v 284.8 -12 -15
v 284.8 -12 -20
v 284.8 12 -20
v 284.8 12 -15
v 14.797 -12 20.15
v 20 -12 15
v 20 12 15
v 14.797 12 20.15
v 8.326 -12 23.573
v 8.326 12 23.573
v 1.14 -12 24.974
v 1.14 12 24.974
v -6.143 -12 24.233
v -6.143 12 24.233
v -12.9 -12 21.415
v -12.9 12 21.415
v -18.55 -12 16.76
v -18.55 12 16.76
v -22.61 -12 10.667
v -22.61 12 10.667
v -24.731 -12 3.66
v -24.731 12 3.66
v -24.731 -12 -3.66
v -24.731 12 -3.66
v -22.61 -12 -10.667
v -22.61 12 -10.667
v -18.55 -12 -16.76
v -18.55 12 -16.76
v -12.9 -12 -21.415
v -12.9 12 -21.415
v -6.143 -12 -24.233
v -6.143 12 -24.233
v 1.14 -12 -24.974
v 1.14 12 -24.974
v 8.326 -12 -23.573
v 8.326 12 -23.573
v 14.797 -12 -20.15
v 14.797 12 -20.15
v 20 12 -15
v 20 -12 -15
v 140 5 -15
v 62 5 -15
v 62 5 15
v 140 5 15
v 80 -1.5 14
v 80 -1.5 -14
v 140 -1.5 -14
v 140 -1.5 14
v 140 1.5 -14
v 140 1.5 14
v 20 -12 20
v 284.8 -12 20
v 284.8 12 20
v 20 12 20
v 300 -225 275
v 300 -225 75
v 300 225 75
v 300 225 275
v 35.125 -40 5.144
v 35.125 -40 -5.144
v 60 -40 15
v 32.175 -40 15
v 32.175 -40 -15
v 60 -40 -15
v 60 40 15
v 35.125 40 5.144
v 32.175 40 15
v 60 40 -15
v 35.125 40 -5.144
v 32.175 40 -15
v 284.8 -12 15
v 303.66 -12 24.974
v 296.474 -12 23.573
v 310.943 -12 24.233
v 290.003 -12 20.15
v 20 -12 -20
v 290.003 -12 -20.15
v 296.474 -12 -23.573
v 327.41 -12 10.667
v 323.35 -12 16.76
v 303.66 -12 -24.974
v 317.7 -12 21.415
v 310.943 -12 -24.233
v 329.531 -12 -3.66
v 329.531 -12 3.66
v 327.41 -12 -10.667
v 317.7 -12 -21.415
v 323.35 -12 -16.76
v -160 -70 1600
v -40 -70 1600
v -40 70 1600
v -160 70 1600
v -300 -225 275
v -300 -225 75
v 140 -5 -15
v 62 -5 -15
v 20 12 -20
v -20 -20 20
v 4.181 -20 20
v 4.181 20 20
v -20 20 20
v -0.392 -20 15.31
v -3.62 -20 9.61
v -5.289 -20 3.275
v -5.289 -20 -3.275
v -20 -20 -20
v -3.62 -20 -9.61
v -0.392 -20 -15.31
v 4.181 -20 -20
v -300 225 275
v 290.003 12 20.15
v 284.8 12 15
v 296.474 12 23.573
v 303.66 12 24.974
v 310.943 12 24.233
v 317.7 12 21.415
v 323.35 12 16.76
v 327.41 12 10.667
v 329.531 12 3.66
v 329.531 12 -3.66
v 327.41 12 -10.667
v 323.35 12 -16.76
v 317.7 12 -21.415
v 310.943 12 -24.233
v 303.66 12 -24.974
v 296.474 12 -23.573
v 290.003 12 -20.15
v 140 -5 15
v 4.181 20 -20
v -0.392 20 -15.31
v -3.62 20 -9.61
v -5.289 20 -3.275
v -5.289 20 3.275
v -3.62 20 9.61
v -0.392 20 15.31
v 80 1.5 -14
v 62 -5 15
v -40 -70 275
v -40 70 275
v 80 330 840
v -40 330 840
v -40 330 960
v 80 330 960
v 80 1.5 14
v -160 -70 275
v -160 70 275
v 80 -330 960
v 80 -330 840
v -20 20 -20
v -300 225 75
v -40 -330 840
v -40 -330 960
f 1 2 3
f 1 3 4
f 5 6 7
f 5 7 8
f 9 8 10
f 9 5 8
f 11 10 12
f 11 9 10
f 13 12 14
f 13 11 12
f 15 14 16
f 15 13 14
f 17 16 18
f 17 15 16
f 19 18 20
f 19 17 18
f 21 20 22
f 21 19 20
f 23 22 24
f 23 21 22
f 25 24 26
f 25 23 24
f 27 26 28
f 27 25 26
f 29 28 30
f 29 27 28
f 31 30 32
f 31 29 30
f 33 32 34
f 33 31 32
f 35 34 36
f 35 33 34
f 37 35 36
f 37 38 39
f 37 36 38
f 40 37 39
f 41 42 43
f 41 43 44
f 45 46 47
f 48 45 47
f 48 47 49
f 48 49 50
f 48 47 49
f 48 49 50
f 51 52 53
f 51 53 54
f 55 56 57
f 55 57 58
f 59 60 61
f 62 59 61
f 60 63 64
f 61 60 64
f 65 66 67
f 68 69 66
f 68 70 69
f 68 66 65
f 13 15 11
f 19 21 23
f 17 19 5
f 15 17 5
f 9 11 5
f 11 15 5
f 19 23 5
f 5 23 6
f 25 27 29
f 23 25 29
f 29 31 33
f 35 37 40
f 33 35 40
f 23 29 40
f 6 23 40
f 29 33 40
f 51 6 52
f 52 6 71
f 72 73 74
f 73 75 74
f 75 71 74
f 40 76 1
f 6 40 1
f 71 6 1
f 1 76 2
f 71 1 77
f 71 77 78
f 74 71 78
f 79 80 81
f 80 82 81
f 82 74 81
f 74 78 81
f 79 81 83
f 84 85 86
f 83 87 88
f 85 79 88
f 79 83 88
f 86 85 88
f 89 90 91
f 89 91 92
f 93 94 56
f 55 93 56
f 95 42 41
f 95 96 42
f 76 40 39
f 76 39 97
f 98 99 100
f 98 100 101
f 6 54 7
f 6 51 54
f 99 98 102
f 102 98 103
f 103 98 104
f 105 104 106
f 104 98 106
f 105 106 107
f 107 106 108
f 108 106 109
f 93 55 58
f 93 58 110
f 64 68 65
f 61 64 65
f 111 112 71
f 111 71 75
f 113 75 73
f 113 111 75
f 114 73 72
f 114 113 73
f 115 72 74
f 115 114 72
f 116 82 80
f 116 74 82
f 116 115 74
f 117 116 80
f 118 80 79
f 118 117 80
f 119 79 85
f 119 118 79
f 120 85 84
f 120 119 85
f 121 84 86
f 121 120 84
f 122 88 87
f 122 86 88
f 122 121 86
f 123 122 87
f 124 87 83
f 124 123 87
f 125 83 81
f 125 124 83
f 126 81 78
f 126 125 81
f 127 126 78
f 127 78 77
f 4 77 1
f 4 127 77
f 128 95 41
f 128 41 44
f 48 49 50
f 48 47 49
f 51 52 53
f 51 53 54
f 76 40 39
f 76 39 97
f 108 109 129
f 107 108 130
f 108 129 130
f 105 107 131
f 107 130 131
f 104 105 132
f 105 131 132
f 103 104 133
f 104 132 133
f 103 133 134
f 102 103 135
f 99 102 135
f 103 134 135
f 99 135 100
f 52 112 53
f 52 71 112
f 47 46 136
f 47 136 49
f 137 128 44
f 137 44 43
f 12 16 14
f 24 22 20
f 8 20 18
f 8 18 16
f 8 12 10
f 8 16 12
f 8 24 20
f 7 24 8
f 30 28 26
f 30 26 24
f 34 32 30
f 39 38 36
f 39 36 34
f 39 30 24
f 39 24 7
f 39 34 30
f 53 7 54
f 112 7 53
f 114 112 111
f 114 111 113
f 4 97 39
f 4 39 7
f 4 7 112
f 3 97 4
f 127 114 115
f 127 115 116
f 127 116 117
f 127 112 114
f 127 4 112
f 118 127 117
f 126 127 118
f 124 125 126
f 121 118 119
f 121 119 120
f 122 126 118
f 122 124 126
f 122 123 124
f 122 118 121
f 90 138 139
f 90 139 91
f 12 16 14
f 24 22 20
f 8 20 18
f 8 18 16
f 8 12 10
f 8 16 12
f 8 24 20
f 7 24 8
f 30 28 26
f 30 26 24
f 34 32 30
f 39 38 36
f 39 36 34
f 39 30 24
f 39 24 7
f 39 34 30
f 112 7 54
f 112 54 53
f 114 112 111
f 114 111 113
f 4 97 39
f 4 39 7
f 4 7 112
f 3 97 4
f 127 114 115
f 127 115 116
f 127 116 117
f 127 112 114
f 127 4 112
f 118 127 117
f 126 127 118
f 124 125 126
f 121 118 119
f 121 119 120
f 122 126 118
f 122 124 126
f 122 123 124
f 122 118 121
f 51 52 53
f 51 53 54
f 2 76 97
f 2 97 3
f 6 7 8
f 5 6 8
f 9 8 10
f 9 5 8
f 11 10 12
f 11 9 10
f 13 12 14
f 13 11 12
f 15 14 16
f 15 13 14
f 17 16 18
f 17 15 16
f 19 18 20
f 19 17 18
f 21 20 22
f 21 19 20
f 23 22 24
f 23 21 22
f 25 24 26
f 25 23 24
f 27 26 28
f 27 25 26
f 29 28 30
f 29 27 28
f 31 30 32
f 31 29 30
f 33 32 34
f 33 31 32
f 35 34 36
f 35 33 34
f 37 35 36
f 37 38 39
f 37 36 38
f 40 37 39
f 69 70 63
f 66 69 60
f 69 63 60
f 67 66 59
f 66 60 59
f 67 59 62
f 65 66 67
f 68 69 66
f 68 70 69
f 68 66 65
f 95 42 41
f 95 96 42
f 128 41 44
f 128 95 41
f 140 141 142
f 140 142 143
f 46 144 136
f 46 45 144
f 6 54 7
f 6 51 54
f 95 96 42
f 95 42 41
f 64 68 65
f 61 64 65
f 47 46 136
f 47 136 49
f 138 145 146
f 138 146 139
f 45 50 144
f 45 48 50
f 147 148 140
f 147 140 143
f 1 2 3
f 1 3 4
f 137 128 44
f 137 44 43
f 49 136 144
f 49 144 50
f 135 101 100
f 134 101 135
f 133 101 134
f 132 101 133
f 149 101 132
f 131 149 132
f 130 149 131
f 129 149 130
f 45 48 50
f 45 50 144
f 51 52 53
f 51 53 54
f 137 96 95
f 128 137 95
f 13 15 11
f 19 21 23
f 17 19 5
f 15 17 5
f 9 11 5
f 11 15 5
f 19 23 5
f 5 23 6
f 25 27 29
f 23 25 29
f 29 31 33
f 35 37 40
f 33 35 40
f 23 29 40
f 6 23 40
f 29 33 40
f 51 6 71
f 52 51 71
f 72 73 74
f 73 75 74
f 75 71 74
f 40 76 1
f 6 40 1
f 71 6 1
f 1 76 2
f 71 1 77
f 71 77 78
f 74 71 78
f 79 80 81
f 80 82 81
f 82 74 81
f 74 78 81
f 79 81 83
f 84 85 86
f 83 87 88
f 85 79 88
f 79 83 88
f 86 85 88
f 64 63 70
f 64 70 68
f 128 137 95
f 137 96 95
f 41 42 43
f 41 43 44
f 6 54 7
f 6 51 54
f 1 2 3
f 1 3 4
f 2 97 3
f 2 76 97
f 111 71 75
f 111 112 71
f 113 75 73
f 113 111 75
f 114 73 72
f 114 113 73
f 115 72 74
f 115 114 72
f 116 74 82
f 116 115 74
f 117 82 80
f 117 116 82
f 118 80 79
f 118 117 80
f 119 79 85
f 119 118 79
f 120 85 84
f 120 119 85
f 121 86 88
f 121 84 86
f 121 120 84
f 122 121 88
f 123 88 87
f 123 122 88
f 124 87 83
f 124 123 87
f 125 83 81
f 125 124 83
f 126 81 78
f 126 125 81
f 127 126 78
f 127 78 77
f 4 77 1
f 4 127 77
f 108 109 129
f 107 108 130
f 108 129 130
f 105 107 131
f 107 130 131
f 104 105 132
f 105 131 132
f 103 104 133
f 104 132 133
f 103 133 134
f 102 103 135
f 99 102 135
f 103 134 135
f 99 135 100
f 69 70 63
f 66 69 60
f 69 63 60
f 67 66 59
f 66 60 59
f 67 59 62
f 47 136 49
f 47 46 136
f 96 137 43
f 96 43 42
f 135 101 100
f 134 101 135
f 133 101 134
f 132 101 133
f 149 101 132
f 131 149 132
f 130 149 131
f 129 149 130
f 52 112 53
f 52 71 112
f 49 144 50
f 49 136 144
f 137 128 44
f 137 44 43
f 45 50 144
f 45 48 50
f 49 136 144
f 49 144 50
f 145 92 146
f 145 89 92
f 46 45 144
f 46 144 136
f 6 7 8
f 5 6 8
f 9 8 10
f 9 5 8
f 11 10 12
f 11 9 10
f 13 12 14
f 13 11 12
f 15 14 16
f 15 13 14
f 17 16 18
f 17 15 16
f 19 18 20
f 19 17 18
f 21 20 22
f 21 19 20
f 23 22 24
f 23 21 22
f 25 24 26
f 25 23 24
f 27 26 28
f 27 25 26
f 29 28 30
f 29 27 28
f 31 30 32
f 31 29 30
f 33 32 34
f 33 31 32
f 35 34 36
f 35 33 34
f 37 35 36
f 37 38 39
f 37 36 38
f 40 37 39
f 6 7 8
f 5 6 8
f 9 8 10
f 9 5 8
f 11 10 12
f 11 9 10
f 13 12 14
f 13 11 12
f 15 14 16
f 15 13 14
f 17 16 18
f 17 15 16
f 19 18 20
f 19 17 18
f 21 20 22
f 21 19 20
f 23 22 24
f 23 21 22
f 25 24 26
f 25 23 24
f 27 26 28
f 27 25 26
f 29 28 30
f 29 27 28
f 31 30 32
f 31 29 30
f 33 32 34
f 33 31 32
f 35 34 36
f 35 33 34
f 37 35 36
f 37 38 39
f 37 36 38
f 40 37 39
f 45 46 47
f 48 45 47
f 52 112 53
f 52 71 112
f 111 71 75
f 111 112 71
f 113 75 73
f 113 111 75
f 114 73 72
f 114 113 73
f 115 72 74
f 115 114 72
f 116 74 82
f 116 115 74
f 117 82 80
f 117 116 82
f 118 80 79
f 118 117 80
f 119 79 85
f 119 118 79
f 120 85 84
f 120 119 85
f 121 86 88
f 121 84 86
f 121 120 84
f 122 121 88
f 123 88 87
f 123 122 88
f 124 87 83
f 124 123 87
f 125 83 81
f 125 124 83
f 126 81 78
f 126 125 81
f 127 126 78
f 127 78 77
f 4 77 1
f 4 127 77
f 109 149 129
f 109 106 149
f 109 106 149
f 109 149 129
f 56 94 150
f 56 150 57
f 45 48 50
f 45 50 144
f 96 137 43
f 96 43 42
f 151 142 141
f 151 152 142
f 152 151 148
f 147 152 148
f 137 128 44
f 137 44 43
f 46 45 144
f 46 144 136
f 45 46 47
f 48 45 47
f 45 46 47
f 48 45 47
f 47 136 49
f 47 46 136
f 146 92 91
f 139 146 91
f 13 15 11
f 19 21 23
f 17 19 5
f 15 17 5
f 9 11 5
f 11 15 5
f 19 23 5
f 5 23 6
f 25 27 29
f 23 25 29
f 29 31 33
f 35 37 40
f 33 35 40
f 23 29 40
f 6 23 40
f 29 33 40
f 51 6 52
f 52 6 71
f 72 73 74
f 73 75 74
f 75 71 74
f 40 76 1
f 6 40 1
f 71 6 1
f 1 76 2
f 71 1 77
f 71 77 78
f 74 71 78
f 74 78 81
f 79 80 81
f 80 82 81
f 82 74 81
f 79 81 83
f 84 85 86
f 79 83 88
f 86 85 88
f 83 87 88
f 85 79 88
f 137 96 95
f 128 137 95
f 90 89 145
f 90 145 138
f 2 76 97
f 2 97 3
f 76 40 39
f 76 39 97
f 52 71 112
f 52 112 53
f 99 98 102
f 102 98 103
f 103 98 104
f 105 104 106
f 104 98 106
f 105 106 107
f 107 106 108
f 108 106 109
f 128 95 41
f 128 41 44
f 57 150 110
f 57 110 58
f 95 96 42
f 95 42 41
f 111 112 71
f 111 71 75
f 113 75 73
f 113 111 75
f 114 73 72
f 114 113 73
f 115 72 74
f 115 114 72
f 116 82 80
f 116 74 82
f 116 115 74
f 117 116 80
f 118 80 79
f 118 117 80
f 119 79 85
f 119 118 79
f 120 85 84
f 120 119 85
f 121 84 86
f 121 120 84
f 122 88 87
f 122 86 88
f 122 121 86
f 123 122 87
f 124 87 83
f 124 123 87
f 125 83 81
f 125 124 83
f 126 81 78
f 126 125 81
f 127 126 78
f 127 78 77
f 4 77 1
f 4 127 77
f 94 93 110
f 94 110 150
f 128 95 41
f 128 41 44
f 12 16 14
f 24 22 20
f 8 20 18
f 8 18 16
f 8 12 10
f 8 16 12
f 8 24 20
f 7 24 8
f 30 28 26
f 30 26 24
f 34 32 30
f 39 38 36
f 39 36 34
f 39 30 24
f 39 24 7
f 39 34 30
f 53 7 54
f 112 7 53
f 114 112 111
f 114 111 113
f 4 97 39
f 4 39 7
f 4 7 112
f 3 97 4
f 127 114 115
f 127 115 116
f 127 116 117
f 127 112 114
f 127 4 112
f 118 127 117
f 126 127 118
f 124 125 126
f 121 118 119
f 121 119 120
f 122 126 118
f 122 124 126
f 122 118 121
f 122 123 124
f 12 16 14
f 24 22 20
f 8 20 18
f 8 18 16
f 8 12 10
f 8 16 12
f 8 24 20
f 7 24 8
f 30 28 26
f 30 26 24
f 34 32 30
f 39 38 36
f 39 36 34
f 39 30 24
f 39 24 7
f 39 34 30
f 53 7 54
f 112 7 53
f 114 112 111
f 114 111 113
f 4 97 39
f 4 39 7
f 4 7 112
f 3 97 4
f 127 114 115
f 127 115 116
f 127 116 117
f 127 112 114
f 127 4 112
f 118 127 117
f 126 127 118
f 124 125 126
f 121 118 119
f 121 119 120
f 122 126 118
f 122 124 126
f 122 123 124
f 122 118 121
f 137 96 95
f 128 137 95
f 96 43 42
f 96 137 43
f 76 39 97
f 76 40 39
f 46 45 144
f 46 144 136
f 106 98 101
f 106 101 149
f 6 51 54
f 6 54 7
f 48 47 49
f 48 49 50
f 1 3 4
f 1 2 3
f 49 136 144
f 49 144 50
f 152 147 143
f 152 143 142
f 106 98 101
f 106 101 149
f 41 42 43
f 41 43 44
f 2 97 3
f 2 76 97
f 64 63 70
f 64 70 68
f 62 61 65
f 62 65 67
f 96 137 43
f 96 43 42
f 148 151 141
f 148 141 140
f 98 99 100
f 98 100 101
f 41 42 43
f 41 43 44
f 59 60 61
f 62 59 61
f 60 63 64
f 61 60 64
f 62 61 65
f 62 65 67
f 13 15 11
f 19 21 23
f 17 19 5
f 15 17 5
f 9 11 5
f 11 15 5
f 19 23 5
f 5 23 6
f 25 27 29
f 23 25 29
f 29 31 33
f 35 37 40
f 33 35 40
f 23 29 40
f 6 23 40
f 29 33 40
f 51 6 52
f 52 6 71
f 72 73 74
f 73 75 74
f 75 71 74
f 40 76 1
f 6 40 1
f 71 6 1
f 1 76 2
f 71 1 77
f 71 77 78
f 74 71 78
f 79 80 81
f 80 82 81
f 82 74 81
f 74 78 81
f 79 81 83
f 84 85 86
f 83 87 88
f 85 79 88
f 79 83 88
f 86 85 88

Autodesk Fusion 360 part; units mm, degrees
sketch "Layout_Side" plane through (0, 0, 0) normal (0, 1, 0) x (1, 0, 0) in component "00_Layout"
  line L0 (0, 0) -> (0, -1676.4) construction
  line L1 (300, -275) -> (-300, -275) construction
  line L2 (-300, -275) -> (-300, -75) construction
  line L3 (-300, -75) -> (300, -75) construction
  line L4 (300, -75) -> (300, -275) construction
  line L5 (300, -275) -> (-300, -75) construction
  line L6 (-300, -275) -> (300, -75) construction
  line L7 (0, -1676.4) -> (600, -1676.4) construction
  line L8 (0, -175) -> (0, -75) construction
  dimension "d1" = 200
  dimension "d2" = 600
  dimension "d4" = 600
  dimension "d5" = 75
  dimension "d6" = 1676.4
sketch "Base_Profile" plane through (0, 0, 0) normal (0, 1, 0) x (1, 0, 0) in component "01_Base_Envelope"
  line L0 (300, -275) -> (-300, -275)
  line L1 (-300, -275) -> (-300, -75)
  line L2 (-300, -75) -> (300, -75)
  line L3 (300, -75) -> (300, -275)
extrude "Chassis_Width_450mm" add sketch "Base_Profile" along normal mid plane 450 makes body 1 in component "01_Base_Envelope"
sketch "Mast_Envelope_Side_Profile" plane through (0, 0, 0) normal (0, 1, 0) x (1, 0, 0) in component "02_Mast_Envelope"
  line L0 (-160, -275) -> (-40, -275)
  line L1 (-40, -275) -> (-40, -1600)
  line L2 (-40, -1600) -> (-160, -1600)
  line L3 (-160, -1600) -> (-160, -275)
  line L4 (300, -275) -> (-300, -275) construction
  dimension "d9" = 120
  dimension "d10" = 1325
  dimension "d11" = 160
extrude "Mast_Envelope_Width_140mm" add sketch "Mast_Envelope_Side_Profile" along normal mid plane 140 separate body makes body 2 in component "02_Mast_Envelope"
sketch "Shared_Carriage_Side_Profile" plane through (0, 0, 0) normal (0, 1, 0) x (1, 0, 0) in component "03_Shared_Carriage"
  line L0 (-40, -840) -> (80, -840)
  line L1 (80, -840) -> (80, -960)
  line L2 (80, -960) -> (-40, -960)
  line L3 (-40, -960) -> (-40, -840)
  dimension "d14" = 120
  dimension "d15" = 120
  dimension "d16" = 40
  dimension "d17" = 840
extrude "Shared_Carriage_Width_660mm" add sketch "Shared_Carriage_Side_Profile" along normal mid plane 660 separate body makes body 3 in component "03_Shared_Carriage"
ref_plane "WorkPlane1" through (0, 300, 0) normal (0, 1, 0) x (0, 0, 1) in component "00_Layout"
sketch "Reach_Left_Floor_2x304p8mm" plane through (0, 300, 0) normal (0, 1, 0) x (1, 0, 0) in component "00_Layout"
  circle A0 centre (80, -400) radius 609.6 construction
  line L0 (80, -400) -> (380.0994, -346.6765) construction
  line L1 (380.0994, -346.6765) -> (450, -50) construction
  dimension "d25" = 80
  dimension "d26" = 400
  dimension "d27" = 450
  dimension "d28" = 50
  dimension "d29" = 609.6
  dimension "d30" = 304.8
  dimension "d31" = 304.8
sketch "Reach_Left_Shelf_2x304p8mm" plane through (0, 300, 0) normal (0, 1, 0) x (1, 0, 0) in component "00_Layout"
  circle A0 centre (80, -1400) radius 609.6 construction
  line L0 (80, -1400) -> (198.6357, -1680.7643) construction
  line L1 (198.6357, -1680.7643) -> (500, -1726.4) construction
  dimension "d32" = 80
  dimension "d33" = 1400
  dimension "d34" = 500
  dimension "d35" = 1726.4
  dimension "d36" = 609.6
  dimension "d37" = 304.8
  dimension "d38" = 304.8
ref_plane "WorkPlane2" through (0, -300, 0) normal (0, 1, 0) x (0, 0, 1) in component "00_Layout"
sketch "Reach_Right_Floor_2x304p8mm" plane through (0, -300, 0) normal (0, 1, 0) x (1, 0, 0) in component "00_Layout"
  circle A0 centre (80, -400) radius 609.6 construction
  line L0 (80, -400) -> (380.0994, -346.6765) construction
  line L1 (380.0994, -346.6765) -> (450, -50) construction
  dimension "d41" = 80
  dimension "d42" = 400
  dimension "d43" = 450
  dimension "d44" = 50
  dimension "d45" = 609.6
  dimension "d46" = 304.8
  dimension "d47" = 304.8
sketch "Reach_Right_Shelf_2x304p8mm" plane through (0, -300, 0) normal (0, 1, 0) x (1, 0, 0) in component "00_Layout"
  circle A0 centre (80, -1400) radius 609.6 construction
  line L0 (80, -1400) -> (198.6357, -1680.7643) construction
  line L1 (198.6357, -1680.7643) -> (500, -1726.4) construction
  dimension "d48" = 80
  dimension "d49" = 1400
  dimension "d50" = 500
  dimension "d51" = 1726.4
  dimension "d52" = 609.6
  dimension "d53" = 304.8
  dimension "d54" = 304.8
sketch "Shoulder_Mount_Profile" plane through (0, 0, 0) normal (0, 1, 0) x (1, 0, 0) in component "04_Left_Shoulder_Standoff"
  line L0 (-20, 20) -> (20, 20)
  line L1 (20, 20) -> (20, -20)
  line L2 (20, -20) -> (-20, -20)
  line L3 (-20, -20) -> (-20, 20)
  dimension "d55" = 20
  dimension "d56" = 20
  dimension "d57" = 40
  dimension "d58" = 40
extrude "Shoulder_Mount" add sketch "Shoulder_Mount_Profile" along normal mid plane 40 separate body makes body 4 in component "04_Left_Shoulder_Standoff"
sketch "Upper_Link_304p8mm_Profile" plane through (0, 0, 0) normal (0, 1, 0) x (1, 0, 0) in component "05_Left_Upper_Arm"
  line L0 (20, 20) -> (284.8, 20)
  line L1 (284.8, 20) -> (284.8, -20)
  line L2 (284.8, -20) -> (20, -20)
  line L3 (20, -20) -> (20, 20)
  dimension "d61" = 20
  dimension "d62" = 20
  dimension "d63" = 264.8
  dimension "d64" = 40
extrude "Upper_Link_304p8mm" add sketch "Upper_Link_304p8mm_Profile" along normal mid plane 24 separate body makes body 5 in component "05_Left_Upper_Arm"
sketch "Joint_Axis_Locations" plane through (0, 0, 0) normal (0, 1, 0) x (1, 0, 0) in component "05_Left_Upper_Arm"
  line L0 (0, 0) -> (304.8, 0) construction
  dimension "d67" = 304.8
sketch "Fore_Link_304p8mm_Profile" plane through (0, 0, 0) normal (0, 1, 0) x (1, 0, 0) in component "06_Left_Forearm"
  line L0 (20, 20) -> (284.8, 20)
  line L1 (284.8, 20) -> (284.8, -20)
  line L2 (284.8, -20) -> (20, -20)
  line L3 (20, -20) -> (20, 20)
  dimension "d68" = 20
  dimension "d69" = 20
  dimension "d70" = 264.8
  dimension "d71" = 40
extrude "Fore_Link_304p8mm" add sketch "Fore_Link_304p8mm_Profile" along normal mid plane 24 separate body makes body 6 in component "06_Left_Forearm"
sketch "Joint_Axis_Locations (2)" plane through (0, 0, 0) normal (0, 1, 0) x (1, 0, 0) in component "06_Left_Forearm"
  line L0 (0, 0) -> (304.8, 0) construction
  dimension "d74" = 304.8
sketch "Palm_Envelope_Profile" plane through (0, 0, 0) normal (0, 1, 0) x (1, 0, 0) in component "07_Left_Wrist_Palm"
  line L0 (5, 15) -> (60, 15)
  line L1 (60, 15) -> (60, -15)
  line L2 (60, -15) -> (5, -15)
  line L3 (5, -15) -> (5, 15)
  dimension "d75" = 5
  dimension "d76" = 15
  dimension "d77" = 55
  dimension "d78" = 30
extrude "Palm_Envelope" add sketch "Palm_Envelope_Profile" along normal mid plane 80 separate body makes body 7 in component "07_Left_Wrist_Palm"
sketch "Joint_Axis_Locations (3)" plane through (0, 0, 0) normal (0, 1, 0) x (1, 0, 0) in component "07_Left_Wrist_Palm"
  line L0 (0, 0) -> (110, 0) construction
  dimension "d81" = 110
sketch "Finger_Envelope_Profile" plane through (0, 0, 0) normal (0, 1, 0) x (1, 0, 0) in component "08_Left_Finger_Positive"
  line L0 (62, 15) -> (140, 15)
  line L1 (140, 15) -> (140, -15)
  line L2 (140, -15) -> (62, -15)
  line L3 (62, -15) -> (62, 15)
  dimension "d88" = 62
  dimension "d89" = 15
  dimension "d90" = 78
  dimension "d91" = 30
extrude "Finger_Envelope" add sketch "Finger_Envelope_Profile" along normal mid plane 10 separate body makes body 8 in component "08_Left_Finger_Positive"
sketch "Soft_Pad_Envelope_Profile" plane through (0, 0, 0) normal (0, 1, 0) x (1, 0, 0) in component "09_Left_Pad_Positive"
  line L0 (80, 14) -> (140, 14)
  line L1 (140, 14) -> (140, -14)
  line L2 (140, -14) -> (80, -14)
  line L3 (80, -14) -> (80, 14)
  dimension "d94" = 80
  dimension "d95" = 14
  dimension "d96" = 60
  dimension "d97" = 28
extrude "Soft_Pad_Envelope" add sketch "Soft_Pad_Envelope_Profile" along normal mid plane 3 separate body makes body 9 in component "09_Left_Pad_Positive"
sketch "Finger_Envelope_Profile (2)" plane through (0, 0, 0) normal (0, 1, 0) x (1, 0, 0) in component "08_Left_Finger_Negative"
  line L0 (62, 15) -> (140, 15)
  line L1 (140, 15) -> (140, -15)
  line L2 (140, -15) -> (62, -15)
  line L3 (62, -15) -> (62, 15)
  dimension "d102" = 62
  dimension "d103" = 15
  dimension "d104" = 78
  dimension "d105" = 30
extrude "Finger_Envelope'" add sketch "Finger_Envelope_Profile (2)" along normal mid plane 10 separate body makes body 10 in component "08_Left_Finger_Negative"
sketch "Soft_Pad_Envelope_Profile (2)" plane through (0, 0, 0) normal (0, 1, 0) x (1, 0, 0) in component "09_Left_Pad_Negative"
  line L0 (80, 14) -> (140, 14)
  line L1 (140, 14) -> (140, -14)
  line L2 (140, -14) -> (80, -14)
  line L3 (80, -14) -> (80, 14)
  dimension "d108" = 80
  dimension "d109" = 14
  dimension "d110" = 60
  dimension "d111" = 28
extrude "Soft_Pad_Envelope'" add sketch "Soft_Pad_Envelope_Profile (2)" along normal mid plane 3 separate body makes body 11 in component "09_Left_Pad_Negative"
sketch "Shoulder_Mount_Profile (2)" plane through (0, 0, 0) normal (0, 1, 0) x (1, 0, 0) in component "04_Right_Shoulder_Standoff"
  line L0 (-20, 20) -> (20, 20)
  line L1 (20, 20) -> (20, -20)
  line L2 (20, -20) -> (-20, -20)
  line L3 (-20, -20) -> (-20, 20)
  dimension "d116" = 20
  dimension "d117" = 20
  dimension "d118" = 40
  dimension "d119" = 40
extrude "Shoulder_Mount'" add sketch "Shoulder_Mount_Profile (2)" along normal mid plane 40 separate body makes body 12 in component "04_Right_Shoulder_Standoff"
sketch "Upper_Link_304p8mm_Profile (2)" plane through (0, 0, 0) normal (0, 1, 0) x (1, 0, 0) in component "05_Right_Upper_Arm"
  line L0 (20, 20) -> (284.8, 20)
  line L1 (284.8, 20) -> (284.8, -20)
  line L2 (284.8, -20) -> (20, -20)
  line L3 (20, -20) -> (20, 20)
  dimension "d122" = 20
  dimension "d123" = 20
  dimension "d124" = 264.8
  dimension "d125" = 40
extrude "Upper_Link_304p8mm'" add sketch "Upper_Link_304p8mm_Profile (2)" along normal mid plane 24 separate body makes body 13 in component "05_Right_Upper_Arm"
sketch "Joint_Axis_Locations (4)" plane through (0, 0, 0) normal (0, 1, 0) x (1, 0, 0) in component "05_Right_Upper_Arm"
  line L0 (0, 0) -> (304.8, 0) construction
  dimension "d128" = 304.8
sketch "Fore_Link_304p8mm_Profile (2)" plane through (0, 0, 0) normal (0, 1, 0) x (1, 0, 0) in component "06_Right_Forearm"
  line L0 (20, 20) -> (284.8, 20)
  line L1 (284.8, 20) -> (284.8, -20)
  line L2 (284.8, -20) -> (20, -20)
  line L3 (20, -20) -> (20, 20)
  dimension "d129" = 20
  dimension "d130" = 20
  dimension "d131" = 264.8
  dimension "d132" = 40
extrude "Fore_Link_304p8mm'" add sketch "Fore_Link_304p8mm_Profile (2)" along normal mid plane 24 separate body makes body 14 in component "06_Right_Forearm"
sketch "Joint_Axis_Locations (5)" plane through (0, 0, 0) normal (0, 1, 0) x (1, 0, 0) in component "06_Right_Forearm"
  line L0 (0, 0) -> (304.8, 0) construction
  dimension "d135" = 304.8
sketch "Palm_Envelope_Profile (2)" plane through (0, 0, 0) normal (0, 1, 0) x (1, 0, 0) in component "07_Right_Wrist_Palm"
  line L0 (5, 15) -> (60, 15)
  line L1 (60, 15) -> (60, -15)
  line L2 (60, -15) -> (5, -15)
  line L3 (5, -15) -> (5, 15)
  dimension "d136" = 5
  dimension "d137" = 15
  dimension "d138" = 55
  dimension "d139" = 30
extrude "Palm_Envelope'" add sketch "Palm_Envelope_Profile (2)" along normal mid plane 80 separate body makes body 15 in component "07_Right_Wrist_Palm"
sketch "Joint_Axis_Locations (6)" plane through (0, 0, 0) normal (0, 1, 0) x (1, 0, 0) in component "07_Right_Wrist_Palm"
  line L0 (0, 0) -> (110, 0) construction
  dimension "d142" = 110
sketch "Finger_Envelope_Profile (3)" plane through (0, 0, 0) normal (0, 1, 0) x (1, 0, 0) in component "08_Right_Finger_Positive"
  line L0 (62, 15) -> (140, 15)
  line L1 (140, 15) -> (140, -15)
  line L2 (140, -15) -> (62, -15)
  line L3 (62, -15) -> (62, 15)
  dimension "d149" = 62
  dimension "d150" = 15
  dimension "d151" = 78
  dimension "d152" = 30
extrude "Finger_Envelope''" add sketch "Finger_Envelope_Profile (3)" along normal mid plane 10 separate body makes body 16 in component "08_Right_Finger_Positive"
sketch "Soft_Pad_Envelope_Profile (3)" plane through (0, 0, 0) normal (0, 1, 0) x (1, 0, 0) in component "09_Right_Pad_Positive"
  line L0 (80, 14) -> (140, 14)
  line L1 (140, 14) -> (140, -14)
  line L2 (140, -14) -> (80, -14)
  line L3 (80, -14) -> (80, 14)
  dimension "d155" = 80
  dimension "d156" = 14
  dimension "d157" = 60
  dimension "d158" = 28
extrude "Soft_Pad_Envelope''" add sketch "Soft_Pad_Envelope_Profile (3)" along normal mid plane 3 separate body makes body 17 in component "09_Right_Pad_Positive"
sketch "Finger_Envelope_Profile (4)" plane through (0, 0, 0) normal (0, 1, 0) x (1, 0, 0) in component "08_Right_Finger_Negative"
  line L0 (62, 15) -> (140, 15)
  line L1 (140, 15) -> (140, -15)
  line L2 (140, -15) -> (62, -15)
  line L3 (62, -15) -> (62, 15)
  dimension "d163" = 62
  dimension "d164" = 15
  dimension "d165" = 78
  dimension "d166" = 30
extrude "Finger_Envelope'''" add sketch "Finger_Envelope_Profile (4)" along normal mid plane 10 separate body makes body 18 in component "08_Right_Finger_Negative"
sketch "Soft_Pad_Envelope_Profile (4)" plane through (0, 0, 0) normal (0, 1, 0) x (1, 0, 0) in component "09_Right_Pad_Negative"
  line L0 (80, 14) -> (140, 14)
  line L1 (140, 14) -> (140, -14)
  line L2 (140, -14) -> (80, -14)
  line L3 (80, -14) -> (80, 14)
  dimension "d169" = 80
  dimension "d170" = 14
  dimension "d171" = 60
  dimension "d172" = 28
extrude "Soft_Pad_Envelope'''" add sketch "Soft_Pad_Envelope_Profile (4)" along normal mid plane 3 separate body makes body 19 in component "09_Right_Pad_Negative"
sketch "Pivot_Housing_Envelopes" plane through (0, 0, 0) normal (0, 1, 0) x (1, 0, 0) in component "05_Left_Upper_Arm"
  circle A0 centre (0, 0) radius 25
  line L0 (0, 0) -> (304.8, 0) construction
  circle A1 centre (304.8, 0) radius 25
  dimension "d177" = 25
  dimension "d178" = 304.8
  dimension "d179" = 25
extrude "Pivot_Housing_Envelopes_24mm" add sketch "Pivot_Housing_Envelopes" along normal mid plane 24 bodies 5 in component "05_Left_Upper_Arm"
sketch "Pivot_Housing_Envelopes (2)" plane through (0, 0, 0) normal (0, 1, 0) x (1, 0, 0) in component "06_Left_Forearm"
  circle A0 centre (0, 0) radius 25
  line L0 (0, 0) -> (304.8, 0) construction
  circle A1 centre (304.8, 0) radius 25
  dimension "d182" = 25
  dimension "d183" = 304.8
  dimension "d184" = 25
extrude "Pivot_Housing_Envelopes_24mm'" add sketch "Pivot_Housing_Envelopes (2)" along normal mid plane 24 bodies 6 in component "06_Left_Forearm"
sketch "Pivot_Housing_Envelopes (3)" plane through (0, 0, 0) normal (0, 1, 0) x (1, 0, 0) in component "05_Right_Upper_Arm"
  circle A0 centre (0, 0) radius 25
  line L0 (0, 0) -> (304.8, 0) construction
  circle A1 centre (304.8, 0) radius 25
  dimension "d187" = 25
  dimension "d188" = 304.8
  dimension "d189" = 25
extrude "Pivot_Housing_Envelopes_24mm''" add sketch "Pivot_Housing_Envelopes (3)" along normal mid plane 24 bodies 13 in component "05_Right_Upper_Arm"
sketch "Pivot_Housing_Envelopes (4)" plane through (0, 0, 0) normal (0, 1, 0) x (1, 0, 0) in component "06_Right_Forearm"
  circle A0 centre (0, 0) radius 25
  line L0 (0, 0) -> (304.8, 0) construction
  circle A1 centre (304.8, 0) radius 25
  dimension "d192" = 25
  dimension "d193" = 304.8
  dimension "d194" = 25
extrude "Pivot_Housing_Envelopes_24mm'''" add sketch "Pivot_Housing_Envelopes (4)" along normal mid plane 24 bodies 14 in component "06_Right_Forearm"
sketch "Pivot_Clearance_25p5mm" plane through (0, 0, 0) normal (0, 1, 0) x (1, 0, 0) in component "04_Left_Shoulder_Standoff"
  line L0 (0, 0) -> (20, 0) construction
  circle A0 centre (20, 0) radius 25.5
  dimension "d197" = 20
  dimension "d198" = 25.5
sketch "Wrist_Sweep_Clearance_35p5mm" plane through (0, 0, 0) normal (0, 1, 0) x (1, 0, 0) in component "07_Left_Wrist_Palm"
  circle A0 centre (0, 0) radius 35.5
  dimension "d203" = 35.5
sketch "Pivot_Clearance_25p5mm (2)" plane through (0, 0, 0) normal (0, 1, 0) x (1, 0, 0) in component "04_Right_Shoulder_Standoff"
  line L0 (0, 0) -> (20, 0) construction
  circle A0 centre (20, 0) radius 25.5
  dimension "d208" = 20
  dimension "d209" = 25.5
sketch "Wrist_Sweep_Clearance_35p5mm (2)" plane through (0, 0, 0) normal (0, 1, 0) x (1, 0, 0) in component "07_Right_Wrist_Palm"
  circle A0 centre (0, 0) radius 35.5
  dimension "d214" = 35.5
extrude "Pivot_Clearance_Cut_This_Component_Only" cut sketch "Pivot_Clearance_25p5mm" along normal mid plane 90 bodies 4 in component "04_Left_Shoulder_Standoff"
extrude "Pivot_Clearance_Cut_This_Component_Only'" cut sketch "Wrist_Sweep_Clearance_35p5mm" along normal mid plane 90 bodies 7 in component "07_Left_Wrist_Palm"
extrude "Pivot_Clearance_Cut_This_Component_Only''" cut sketch "Pivot_Clearance_25p5mm (2)" along normal mid plane 90 bodies 12 in component "04_Right_Shoulder_Standoff"
extrude "Pivot_Clearance_Cut_This_Component_Only'''" cut sketch "Wrist_Sweep_Clearance_35p5mm (2)" along normal mid plane 90 bodies 15 in component "07_Right_Wrist_Palm"
component "00_Layout" placed x (1, 0, 0) y (0, 1, 0) z (0, 0, 1) at (0, 0, 0)
component "01_Base_Envelope" placed x (1, 0, 0) y (0, 1, 0) z (0, 0, 1) at (0, 0, 0)
component "02_Mast_Envelope" placed x (1, 0, 0) y (0, 1, 0) z (0, 0, 1) at (0, 0, 0)
component "03_Shared_Carriage" placed x (1, 0, 0) y (0, 1, 0) z (0, 0, 1) at (0, 0, 0)
component "04_Left_Shoulder_Standoff" placed x (1, 0, 0) y (0, 1, 0) z (0, 0, 1) at (0, 0, 0)
component "05_Left_Upper_Arm" placed x (1, 0, 0) y (0, 1, 0) z (0, 0, 1) at (0, 0, 0)
component "06_Left_Forearm" placed x (1, 0, 0) y (0, 1, 0) z (0, 0, 1) at (0, 0, 0)
component "07_Left_Wrist_Palm" placed x (1, 0, 0) y (0, 1, 0) z (0, 0, 1) at (0, 0, 0)
component "08_Left_Finger_Positive" placed x (1, 0, 0) y (0, 1, 0) z (0, 0, 1) at (0, 0, 0)
component "09_Left_Pad_Positive" placed x (1, 0, 0) y (0, 1, 0) z (0, 0, 1) at (0, 0, 0)
component "08_Left_Finger_Negative" placed x (1, 0, 0) y (0, 1, 0) z (0, 0, 1) at (0, 0, 0)
component "09_Left_Pad_Negative" placed x (1, 0, 0) y (0, 1, 0) z (0, 0, 1) at (0, 0, 0)
component "04_Right_Shoulder_Standoff" placed x (1, 0, 0) y (0, 1, 0) z (0, 0, 1) at (0, 0, 0)
component "05_Right_Upper_Arm" placed x (1, 0, 0) y (0, 1, 0) z (0, 0, 1) at (0, 0, 0)
component "06_Right_Forearm" placed x (1, 0, 0) y (0, 1, 0) z (0, 0, 1) at (0, 0, 0)
component "07_Right_Wrist_Palm" placed x (1, 0, 0) y (0, 1, 0) z (0, 0, 1) at (0, 0, 0)
component "08_Right_Finger_Positive" placed x (1, 0, 0) y (0, 1, 0) z (0, 0, 1) at (0, 0, 0)
component "09_Right_Pad_Positive" placed x (1, 0, 0) y (0, 1, 0) z (0, 0, 1) at (0, 0, 0)
component "08_Right_Finger_Negative" placed x (1, 0, 0) y (0, 1, 0) z (0, 0, 1) at (0, 0, 0)
component "09_Right_Pad_Negative" placed x (1, 0, 0) y (0, 1, 0) z (0, 0, 1) at (0, 0, 0)
